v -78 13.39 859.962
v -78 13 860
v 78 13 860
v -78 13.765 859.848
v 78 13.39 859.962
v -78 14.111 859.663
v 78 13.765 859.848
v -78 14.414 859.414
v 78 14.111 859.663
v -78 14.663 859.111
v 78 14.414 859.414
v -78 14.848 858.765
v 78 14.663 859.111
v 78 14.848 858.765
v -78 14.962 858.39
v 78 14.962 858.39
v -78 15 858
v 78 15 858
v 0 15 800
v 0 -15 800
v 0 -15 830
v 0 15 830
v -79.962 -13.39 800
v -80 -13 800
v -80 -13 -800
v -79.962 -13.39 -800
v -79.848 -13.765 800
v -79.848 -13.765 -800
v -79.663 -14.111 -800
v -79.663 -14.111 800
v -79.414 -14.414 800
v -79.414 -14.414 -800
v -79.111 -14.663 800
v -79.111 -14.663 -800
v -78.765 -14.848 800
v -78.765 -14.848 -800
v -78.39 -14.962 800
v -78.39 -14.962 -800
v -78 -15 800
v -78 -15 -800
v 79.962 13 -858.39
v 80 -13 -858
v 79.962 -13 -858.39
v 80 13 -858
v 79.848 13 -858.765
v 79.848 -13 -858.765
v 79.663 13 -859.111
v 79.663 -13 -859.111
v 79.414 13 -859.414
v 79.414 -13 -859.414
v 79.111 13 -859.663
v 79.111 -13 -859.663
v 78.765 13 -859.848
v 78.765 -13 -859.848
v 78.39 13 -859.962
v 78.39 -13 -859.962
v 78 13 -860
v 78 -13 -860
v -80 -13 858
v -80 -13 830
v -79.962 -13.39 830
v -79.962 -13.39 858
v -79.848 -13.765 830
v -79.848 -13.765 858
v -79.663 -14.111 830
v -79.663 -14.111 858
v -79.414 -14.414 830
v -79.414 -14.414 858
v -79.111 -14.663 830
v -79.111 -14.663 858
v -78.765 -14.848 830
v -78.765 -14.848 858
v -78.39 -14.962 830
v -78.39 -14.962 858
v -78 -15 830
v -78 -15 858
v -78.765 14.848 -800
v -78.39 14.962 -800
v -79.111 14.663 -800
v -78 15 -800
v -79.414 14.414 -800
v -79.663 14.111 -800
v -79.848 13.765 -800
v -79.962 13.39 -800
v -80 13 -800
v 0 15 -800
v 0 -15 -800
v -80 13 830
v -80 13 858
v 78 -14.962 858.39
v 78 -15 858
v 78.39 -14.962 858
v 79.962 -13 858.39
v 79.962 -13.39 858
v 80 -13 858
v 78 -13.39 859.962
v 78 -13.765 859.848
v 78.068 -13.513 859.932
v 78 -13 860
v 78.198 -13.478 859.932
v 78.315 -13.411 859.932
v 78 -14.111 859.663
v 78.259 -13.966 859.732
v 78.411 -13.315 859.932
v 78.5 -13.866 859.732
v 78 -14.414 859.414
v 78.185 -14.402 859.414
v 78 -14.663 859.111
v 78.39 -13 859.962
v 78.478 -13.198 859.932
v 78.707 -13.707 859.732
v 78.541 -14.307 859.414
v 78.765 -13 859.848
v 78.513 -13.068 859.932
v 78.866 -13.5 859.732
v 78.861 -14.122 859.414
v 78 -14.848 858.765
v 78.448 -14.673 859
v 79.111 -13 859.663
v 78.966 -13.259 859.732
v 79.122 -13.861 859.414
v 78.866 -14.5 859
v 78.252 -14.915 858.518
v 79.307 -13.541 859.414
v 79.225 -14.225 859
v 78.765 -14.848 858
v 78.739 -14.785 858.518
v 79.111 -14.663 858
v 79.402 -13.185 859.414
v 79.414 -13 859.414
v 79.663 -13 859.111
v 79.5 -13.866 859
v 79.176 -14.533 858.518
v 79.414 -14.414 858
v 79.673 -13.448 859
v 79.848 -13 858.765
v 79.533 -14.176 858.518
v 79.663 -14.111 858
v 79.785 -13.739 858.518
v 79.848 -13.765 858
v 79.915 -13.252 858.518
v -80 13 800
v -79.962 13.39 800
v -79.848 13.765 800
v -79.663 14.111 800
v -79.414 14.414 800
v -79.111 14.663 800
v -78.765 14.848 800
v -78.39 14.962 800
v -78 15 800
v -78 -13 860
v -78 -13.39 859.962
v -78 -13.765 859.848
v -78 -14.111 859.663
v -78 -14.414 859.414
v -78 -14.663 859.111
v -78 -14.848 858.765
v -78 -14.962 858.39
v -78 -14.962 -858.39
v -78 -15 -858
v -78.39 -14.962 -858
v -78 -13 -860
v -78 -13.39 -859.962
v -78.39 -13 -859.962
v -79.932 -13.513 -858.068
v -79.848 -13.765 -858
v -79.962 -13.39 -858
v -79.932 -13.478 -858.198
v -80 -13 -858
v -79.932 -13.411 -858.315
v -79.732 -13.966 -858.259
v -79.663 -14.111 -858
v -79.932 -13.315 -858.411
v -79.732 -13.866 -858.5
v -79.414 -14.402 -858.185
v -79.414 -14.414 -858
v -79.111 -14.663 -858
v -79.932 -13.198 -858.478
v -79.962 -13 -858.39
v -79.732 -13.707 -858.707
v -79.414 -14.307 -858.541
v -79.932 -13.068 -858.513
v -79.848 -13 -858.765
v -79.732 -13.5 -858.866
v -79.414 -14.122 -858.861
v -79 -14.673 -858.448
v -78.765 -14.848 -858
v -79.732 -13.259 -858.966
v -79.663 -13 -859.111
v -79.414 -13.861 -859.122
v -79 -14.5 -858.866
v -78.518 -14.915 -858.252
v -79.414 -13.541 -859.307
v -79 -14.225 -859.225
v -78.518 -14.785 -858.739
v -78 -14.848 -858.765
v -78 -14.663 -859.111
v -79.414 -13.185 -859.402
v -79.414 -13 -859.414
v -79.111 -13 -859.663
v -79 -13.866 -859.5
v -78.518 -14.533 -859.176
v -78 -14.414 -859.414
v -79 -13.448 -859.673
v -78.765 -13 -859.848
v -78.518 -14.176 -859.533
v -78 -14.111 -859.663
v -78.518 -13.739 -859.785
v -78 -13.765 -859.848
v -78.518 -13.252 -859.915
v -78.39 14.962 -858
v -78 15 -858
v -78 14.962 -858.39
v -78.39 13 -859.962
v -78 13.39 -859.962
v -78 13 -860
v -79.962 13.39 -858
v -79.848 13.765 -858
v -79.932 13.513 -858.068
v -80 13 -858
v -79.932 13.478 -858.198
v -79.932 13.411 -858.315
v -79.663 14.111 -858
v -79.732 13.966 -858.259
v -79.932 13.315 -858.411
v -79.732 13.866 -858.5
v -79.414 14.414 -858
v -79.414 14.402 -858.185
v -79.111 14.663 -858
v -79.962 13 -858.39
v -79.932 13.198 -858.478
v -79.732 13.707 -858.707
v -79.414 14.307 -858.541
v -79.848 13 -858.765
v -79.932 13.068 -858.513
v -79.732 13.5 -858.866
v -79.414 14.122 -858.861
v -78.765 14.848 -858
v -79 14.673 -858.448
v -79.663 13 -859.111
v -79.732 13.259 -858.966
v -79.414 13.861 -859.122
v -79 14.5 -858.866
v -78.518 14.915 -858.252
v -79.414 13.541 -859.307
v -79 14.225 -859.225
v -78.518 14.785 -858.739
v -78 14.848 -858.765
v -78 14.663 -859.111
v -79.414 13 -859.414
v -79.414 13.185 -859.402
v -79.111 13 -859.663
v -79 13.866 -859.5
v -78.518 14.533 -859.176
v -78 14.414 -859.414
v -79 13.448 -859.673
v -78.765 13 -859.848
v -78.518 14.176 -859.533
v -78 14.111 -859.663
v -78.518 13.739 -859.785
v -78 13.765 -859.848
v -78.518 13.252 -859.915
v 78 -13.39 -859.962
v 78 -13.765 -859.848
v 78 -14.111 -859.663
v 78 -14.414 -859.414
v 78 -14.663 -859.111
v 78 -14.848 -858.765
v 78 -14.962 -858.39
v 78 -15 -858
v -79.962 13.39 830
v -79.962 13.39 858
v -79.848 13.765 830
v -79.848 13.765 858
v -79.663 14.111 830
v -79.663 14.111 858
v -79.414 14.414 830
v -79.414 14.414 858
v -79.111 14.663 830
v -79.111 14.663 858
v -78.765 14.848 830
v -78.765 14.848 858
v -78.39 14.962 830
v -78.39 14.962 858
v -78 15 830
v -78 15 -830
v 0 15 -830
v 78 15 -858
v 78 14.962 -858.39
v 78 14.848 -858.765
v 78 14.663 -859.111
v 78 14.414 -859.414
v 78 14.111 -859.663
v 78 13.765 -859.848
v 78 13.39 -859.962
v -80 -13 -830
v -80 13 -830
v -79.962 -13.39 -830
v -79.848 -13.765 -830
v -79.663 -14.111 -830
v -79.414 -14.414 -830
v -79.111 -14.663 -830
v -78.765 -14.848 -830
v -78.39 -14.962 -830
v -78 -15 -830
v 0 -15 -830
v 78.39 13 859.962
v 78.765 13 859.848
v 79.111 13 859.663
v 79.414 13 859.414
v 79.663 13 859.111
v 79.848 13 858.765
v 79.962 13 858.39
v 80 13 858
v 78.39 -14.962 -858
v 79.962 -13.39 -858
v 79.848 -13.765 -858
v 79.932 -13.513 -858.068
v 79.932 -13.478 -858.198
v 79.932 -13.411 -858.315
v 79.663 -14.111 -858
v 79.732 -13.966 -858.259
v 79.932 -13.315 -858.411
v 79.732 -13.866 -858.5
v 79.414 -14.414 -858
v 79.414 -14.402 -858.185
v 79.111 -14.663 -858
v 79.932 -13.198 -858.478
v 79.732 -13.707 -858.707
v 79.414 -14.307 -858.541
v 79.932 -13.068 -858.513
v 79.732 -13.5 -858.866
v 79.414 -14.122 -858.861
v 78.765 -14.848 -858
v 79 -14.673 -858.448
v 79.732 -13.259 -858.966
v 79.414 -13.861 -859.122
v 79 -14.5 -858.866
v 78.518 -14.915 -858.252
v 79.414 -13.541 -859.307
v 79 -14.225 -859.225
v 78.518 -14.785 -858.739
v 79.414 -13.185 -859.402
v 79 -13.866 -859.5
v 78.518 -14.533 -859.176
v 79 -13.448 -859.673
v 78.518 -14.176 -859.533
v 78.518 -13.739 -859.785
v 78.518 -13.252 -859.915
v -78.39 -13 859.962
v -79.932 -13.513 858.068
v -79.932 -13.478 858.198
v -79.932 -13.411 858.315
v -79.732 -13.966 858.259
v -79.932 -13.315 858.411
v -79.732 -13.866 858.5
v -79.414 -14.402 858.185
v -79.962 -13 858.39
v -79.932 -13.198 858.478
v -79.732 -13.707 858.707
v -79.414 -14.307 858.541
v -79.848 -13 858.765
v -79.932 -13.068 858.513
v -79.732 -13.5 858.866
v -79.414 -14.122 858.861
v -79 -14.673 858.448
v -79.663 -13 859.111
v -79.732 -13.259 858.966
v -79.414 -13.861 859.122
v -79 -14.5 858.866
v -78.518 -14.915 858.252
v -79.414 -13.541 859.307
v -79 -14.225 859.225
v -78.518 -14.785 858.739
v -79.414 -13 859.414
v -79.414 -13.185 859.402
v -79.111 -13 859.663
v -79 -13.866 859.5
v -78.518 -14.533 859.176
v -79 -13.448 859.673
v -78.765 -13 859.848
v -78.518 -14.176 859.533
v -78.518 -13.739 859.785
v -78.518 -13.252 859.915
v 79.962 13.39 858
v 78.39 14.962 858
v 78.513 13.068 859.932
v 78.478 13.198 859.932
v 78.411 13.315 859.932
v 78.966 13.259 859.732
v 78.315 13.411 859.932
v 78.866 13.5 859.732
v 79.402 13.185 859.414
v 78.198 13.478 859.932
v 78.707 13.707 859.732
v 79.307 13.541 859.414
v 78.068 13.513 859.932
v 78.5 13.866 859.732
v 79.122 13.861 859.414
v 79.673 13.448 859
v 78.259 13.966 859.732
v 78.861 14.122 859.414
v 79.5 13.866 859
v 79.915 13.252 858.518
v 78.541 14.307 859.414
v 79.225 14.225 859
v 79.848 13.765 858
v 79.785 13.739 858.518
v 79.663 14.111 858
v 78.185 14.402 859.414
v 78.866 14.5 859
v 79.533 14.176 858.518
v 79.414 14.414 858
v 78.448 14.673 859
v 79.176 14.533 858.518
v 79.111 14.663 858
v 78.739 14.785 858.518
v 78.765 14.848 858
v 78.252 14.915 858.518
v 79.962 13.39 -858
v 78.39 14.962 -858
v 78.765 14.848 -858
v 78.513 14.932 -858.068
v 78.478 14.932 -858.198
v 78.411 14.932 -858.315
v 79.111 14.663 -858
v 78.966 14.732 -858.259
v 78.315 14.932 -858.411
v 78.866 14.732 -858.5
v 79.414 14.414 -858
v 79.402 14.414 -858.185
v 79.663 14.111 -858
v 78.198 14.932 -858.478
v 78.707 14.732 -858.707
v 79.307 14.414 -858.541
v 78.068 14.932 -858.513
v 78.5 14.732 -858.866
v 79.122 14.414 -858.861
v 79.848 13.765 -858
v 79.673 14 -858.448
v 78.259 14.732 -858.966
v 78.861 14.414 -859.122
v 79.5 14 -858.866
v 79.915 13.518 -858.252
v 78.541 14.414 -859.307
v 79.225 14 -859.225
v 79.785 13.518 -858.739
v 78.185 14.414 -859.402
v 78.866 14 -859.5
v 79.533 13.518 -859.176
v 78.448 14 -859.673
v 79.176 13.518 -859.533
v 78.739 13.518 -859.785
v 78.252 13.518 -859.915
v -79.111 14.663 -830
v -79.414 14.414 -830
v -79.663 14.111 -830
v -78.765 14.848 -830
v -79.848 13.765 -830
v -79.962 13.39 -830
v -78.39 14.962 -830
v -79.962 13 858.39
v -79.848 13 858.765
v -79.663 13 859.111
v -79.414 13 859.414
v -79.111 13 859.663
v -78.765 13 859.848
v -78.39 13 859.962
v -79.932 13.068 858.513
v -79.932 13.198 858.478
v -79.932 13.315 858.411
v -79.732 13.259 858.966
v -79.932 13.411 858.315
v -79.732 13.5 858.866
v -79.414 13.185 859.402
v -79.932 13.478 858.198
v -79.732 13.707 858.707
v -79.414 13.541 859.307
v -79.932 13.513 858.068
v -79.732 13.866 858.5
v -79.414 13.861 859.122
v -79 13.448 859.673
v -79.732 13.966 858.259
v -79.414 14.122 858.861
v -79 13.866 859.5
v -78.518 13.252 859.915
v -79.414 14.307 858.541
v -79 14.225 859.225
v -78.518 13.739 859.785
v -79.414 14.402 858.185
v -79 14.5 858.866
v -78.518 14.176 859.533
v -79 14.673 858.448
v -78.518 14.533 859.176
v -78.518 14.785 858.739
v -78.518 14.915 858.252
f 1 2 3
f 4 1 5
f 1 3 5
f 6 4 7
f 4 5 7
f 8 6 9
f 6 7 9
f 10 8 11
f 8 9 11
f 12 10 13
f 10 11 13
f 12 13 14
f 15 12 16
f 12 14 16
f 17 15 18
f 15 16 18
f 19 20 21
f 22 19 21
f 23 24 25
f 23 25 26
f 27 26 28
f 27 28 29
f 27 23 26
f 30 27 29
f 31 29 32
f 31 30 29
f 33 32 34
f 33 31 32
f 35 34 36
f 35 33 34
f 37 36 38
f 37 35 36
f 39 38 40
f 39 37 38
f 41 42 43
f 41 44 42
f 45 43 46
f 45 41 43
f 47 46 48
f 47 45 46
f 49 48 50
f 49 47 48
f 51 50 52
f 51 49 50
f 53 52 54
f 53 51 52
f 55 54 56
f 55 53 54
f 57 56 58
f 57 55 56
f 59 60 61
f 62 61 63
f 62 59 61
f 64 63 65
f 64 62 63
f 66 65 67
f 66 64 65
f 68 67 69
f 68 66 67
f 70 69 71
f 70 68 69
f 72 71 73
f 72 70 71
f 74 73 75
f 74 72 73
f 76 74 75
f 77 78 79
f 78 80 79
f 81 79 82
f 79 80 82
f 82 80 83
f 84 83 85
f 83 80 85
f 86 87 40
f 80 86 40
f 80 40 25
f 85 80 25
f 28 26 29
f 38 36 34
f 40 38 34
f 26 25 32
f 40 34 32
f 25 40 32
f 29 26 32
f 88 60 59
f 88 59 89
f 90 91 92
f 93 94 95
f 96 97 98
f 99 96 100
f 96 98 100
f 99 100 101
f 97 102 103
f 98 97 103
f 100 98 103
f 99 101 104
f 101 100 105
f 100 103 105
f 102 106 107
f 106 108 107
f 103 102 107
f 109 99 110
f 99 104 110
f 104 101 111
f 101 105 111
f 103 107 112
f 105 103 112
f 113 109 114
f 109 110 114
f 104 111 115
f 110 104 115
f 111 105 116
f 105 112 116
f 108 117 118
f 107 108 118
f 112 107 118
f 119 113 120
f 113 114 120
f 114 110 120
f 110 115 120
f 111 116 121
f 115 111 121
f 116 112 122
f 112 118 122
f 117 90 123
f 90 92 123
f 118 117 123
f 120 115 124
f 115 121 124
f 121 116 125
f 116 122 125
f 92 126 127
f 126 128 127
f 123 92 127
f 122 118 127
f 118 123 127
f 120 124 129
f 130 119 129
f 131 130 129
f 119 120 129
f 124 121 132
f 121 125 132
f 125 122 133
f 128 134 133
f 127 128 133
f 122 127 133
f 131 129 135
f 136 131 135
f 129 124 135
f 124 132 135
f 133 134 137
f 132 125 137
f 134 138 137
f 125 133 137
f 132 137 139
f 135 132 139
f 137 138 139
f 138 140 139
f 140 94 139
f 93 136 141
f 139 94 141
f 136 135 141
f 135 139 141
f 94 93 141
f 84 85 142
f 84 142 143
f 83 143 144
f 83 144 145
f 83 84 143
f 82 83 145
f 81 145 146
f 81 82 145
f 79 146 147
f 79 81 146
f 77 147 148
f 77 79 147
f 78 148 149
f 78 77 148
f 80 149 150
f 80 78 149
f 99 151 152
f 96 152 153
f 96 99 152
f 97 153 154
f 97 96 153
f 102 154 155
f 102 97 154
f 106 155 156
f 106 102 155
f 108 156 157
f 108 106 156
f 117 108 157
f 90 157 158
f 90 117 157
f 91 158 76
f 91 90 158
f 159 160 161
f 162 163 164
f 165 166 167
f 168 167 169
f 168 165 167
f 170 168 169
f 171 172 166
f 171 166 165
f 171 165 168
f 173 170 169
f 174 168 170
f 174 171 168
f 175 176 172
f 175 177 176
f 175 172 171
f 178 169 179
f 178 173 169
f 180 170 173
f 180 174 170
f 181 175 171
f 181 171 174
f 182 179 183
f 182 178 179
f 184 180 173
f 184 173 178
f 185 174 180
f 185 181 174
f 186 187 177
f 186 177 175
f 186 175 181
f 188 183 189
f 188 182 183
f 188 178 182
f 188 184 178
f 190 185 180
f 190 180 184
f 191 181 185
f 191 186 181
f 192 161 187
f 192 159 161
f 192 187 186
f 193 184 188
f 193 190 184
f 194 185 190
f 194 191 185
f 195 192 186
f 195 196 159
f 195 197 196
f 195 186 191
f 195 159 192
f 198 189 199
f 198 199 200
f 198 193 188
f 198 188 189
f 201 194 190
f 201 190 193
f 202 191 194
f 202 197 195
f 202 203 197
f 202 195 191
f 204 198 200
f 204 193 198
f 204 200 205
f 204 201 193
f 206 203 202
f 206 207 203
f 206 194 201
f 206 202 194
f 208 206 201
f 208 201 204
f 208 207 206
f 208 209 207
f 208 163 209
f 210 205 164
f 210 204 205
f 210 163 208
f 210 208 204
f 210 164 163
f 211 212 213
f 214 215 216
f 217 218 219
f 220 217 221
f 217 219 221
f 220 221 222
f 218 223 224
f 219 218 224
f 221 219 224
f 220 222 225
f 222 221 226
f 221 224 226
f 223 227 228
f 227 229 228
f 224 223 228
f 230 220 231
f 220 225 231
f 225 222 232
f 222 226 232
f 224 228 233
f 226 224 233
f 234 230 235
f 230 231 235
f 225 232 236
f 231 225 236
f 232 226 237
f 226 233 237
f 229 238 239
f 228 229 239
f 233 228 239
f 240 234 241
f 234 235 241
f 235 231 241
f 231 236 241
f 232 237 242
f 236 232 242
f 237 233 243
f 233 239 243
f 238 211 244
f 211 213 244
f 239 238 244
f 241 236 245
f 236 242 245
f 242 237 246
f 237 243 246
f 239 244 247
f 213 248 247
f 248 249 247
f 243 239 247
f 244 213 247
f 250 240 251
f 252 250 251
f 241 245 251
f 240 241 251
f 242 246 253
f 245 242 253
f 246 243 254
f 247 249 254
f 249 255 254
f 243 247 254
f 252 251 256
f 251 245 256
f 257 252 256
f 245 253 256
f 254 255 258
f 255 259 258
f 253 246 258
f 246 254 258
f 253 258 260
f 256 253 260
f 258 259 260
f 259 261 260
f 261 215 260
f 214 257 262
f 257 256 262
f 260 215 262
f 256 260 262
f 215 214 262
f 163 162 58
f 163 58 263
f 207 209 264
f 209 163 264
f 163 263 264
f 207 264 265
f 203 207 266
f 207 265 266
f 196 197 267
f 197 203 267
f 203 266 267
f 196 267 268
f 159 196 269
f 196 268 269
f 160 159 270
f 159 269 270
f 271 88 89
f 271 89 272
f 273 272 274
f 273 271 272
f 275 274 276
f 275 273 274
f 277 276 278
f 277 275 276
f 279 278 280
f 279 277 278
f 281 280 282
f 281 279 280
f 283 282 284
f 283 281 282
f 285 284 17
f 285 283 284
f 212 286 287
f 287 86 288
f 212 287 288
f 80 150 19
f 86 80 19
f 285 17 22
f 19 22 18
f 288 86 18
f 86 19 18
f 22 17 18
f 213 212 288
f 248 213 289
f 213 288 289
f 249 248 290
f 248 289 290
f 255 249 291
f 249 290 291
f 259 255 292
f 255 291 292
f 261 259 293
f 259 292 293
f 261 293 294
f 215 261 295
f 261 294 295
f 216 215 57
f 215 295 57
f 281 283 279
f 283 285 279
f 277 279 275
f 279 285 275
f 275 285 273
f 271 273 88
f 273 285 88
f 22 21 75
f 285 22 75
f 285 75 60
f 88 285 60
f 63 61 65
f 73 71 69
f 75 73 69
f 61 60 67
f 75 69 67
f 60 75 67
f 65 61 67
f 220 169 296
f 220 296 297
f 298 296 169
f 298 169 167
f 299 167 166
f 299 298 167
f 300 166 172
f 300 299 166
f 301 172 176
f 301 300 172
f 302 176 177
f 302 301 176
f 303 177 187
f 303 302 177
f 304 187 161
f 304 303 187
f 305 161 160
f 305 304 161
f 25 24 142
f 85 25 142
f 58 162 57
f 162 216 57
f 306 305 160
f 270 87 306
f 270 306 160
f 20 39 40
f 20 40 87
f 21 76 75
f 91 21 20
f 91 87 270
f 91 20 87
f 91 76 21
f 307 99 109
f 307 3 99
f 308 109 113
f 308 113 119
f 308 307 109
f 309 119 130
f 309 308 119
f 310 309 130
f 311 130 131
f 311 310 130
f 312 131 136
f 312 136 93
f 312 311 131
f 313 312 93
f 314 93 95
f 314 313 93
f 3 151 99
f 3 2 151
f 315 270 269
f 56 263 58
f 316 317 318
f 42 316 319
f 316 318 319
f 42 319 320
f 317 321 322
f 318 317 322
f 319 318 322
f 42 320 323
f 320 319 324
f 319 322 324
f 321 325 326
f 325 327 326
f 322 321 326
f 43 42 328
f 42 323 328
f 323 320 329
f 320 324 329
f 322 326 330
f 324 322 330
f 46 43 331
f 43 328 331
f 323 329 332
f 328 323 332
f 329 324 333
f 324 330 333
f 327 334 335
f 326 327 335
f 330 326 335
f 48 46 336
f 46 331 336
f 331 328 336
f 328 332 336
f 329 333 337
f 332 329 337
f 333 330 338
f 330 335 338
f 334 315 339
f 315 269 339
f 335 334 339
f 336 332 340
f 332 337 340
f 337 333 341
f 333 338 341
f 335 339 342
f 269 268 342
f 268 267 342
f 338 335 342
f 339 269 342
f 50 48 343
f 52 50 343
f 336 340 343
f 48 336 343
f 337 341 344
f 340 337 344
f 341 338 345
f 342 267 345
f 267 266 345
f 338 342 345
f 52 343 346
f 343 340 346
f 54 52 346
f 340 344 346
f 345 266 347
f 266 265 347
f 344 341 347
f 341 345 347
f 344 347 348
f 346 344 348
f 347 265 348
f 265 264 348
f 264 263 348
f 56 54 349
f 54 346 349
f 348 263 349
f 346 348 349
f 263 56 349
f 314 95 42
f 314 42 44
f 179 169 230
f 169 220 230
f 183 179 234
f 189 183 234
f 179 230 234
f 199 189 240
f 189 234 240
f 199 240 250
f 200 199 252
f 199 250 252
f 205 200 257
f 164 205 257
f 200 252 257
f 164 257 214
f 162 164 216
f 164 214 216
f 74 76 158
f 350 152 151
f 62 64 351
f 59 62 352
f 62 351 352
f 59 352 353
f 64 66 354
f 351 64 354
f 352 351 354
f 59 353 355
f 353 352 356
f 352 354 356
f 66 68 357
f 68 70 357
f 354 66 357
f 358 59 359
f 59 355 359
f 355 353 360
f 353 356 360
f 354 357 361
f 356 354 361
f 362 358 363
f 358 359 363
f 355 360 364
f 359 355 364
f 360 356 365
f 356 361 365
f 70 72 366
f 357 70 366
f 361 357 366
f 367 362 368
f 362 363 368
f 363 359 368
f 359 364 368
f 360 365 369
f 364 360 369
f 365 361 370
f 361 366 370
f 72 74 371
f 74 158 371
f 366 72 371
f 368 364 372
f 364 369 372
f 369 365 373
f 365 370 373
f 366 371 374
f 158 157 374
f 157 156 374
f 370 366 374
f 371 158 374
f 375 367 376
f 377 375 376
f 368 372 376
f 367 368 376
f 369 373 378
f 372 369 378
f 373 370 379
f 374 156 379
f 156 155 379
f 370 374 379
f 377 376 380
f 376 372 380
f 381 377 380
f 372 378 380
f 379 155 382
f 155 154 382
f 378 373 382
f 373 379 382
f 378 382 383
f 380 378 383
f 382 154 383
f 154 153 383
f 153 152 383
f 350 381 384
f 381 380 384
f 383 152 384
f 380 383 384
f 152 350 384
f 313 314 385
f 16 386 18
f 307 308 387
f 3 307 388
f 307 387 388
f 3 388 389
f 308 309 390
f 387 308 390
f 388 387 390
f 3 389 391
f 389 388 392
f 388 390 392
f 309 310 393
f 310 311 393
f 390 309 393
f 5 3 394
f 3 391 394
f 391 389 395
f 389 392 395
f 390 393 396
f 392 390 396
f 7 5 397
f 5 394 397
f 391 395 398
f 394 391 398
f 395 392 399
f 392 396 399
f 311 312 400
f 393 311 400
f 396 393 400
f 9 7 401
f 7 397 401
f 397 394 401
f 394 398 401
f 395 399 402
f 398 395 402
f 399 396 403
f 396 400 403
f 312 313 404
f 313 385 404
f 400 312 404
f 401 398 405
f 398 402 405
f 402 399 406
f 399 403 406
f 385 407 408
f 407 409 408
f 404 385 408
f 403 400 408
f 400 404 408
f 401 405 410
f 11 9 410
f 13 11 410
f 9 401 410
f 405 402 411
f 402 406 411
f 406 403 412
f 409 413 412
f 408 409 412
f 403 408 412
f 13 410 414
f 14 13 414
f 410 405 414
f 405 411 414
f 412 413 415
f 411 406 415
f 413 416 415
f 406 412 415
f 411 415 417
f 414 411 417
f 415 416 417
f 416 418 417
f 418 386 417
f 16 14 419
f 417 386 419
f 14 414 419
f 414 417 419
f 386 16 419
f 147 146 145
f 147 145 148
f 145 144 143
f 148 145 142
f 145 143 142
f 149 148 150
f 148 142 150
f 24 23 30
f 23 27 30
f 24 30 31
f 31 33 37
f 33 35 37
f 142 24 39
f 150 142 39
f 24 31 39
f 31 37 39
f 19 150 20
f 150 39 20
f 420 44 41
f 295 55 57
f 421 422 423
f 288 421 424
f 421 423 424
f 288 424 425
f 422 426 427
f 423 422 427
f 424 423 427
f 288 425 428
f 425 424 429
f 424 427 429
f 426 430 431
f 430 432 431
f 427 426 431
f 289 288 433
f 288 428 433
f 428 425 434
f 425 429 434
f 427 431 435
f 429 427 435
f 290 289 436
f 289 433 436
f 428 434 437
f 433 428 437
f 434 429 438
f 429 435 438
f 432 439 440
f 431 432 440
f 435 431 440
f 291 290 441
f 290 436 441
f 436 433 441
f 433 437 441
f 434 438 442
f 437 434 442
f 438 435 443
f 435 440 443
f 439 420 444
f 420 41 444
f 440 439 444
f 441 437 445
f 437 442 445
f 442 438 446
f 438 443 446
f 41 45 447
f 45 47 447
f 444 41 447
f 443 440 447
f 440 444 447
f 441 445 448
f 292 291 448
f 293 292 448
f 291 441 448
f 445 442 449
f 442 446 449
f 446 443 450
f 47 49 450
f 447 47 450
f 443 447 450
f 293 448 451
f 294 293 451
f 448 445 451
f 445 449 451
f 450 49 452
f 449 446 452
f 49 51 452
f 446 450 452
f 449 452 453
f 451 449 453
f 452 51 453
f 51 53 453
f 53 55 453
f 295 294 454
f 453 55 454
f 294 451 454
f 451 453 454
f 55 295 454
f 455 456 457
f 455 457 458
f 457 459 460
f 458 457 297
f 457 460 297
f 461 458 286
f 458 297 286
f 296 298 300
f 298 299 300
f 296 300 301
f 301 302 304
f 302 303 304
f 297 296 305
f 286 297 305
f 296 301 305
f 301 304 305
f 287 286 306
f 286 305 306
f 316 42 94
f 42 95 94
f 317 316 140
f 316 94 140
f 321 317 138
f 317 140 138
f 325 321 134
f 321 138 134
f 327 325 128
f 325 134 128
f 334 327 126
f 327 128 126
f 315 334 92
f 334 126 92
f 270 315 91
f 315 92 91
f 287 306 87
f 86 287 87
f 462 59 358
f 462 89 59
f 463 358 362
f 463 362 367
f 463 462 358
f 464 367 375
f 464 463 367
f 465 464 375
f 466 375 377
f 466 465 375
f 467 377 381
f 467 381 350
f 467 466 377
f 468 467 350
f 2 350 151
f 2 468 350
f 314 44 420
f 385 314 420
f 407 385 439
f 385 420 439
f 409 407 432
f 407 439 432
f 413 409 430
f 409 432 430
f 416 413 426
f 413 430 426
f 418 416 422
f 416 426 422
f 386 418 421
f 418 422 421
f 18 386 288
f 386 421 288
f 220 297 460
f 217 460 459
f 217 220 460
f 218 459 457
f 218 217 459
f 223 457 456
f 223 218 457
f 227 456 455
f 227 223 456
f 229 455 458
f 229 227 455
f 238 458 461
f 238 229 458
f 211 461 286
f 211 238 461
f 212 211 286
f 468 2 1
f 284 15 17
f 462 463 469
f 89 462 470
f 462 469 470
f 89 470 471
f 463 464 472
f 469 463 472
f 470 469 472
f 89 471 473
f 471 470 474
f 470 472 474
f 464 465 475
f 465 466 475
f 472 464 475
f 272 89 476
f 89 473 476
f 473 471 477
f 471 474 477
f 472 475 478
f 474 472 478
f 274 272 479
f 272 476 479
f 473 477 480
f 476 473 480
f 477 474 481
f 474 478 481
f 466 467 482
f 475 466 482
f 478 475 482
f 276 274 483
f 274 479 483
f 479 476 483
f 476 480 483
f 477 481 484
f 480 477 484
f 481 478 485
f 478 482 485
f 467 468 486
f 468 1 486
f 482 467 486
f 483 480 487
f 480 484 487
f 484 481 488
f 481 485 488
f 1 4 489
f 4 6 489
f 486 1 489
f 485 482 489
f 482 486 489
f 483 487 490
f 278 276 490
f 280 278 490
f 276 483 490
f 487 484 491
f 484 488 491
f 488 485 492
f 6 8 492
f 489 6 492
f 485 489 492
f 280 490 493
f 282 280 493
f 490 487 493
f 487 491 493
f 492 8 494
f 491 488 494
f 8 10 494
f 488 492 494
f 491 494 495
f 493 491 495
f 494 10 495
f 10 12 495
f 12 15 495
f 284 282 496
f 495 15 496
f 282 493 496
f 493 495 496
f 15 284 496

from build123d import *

# Parameters (mm, degrees)
F0_W     = 160
F0_H     = 30
F1_DEPTH = 860
F2_R     = 2
F3_W     = 2
F3_H     = 30
F3_W_2   = 78
F4_DEPTH = 30.001


with BuildPart() as f1:
    # F0 (on Top) → F1 (new body, symmetric)
    with BuildSketch(Plane.XY):
        Rectangle(F0_W, F0_H)
    extrude(amount=F1_DEPTH, both=True)

    # F2
    f2_edges = [f1.edges().sort_by_distance(p)[0] for p in [
        (0, -15, -860),
        (80, -15, 0),
        (0, -15, 860),
        (-80, -15, 0),
        (80, 0, -860),
        (80, 15, 0),
        (80, 0, 860),
        (0, 15, 860),
        (-80, 0, 860),
        (0, 15, -860),
        (-80, 15, 0),
        (-80, 0, -860),
    ]]
    fillet(f2_edges, radius=F2_R)

    # F3 (on face) → F4 (cut, through all)
    with BuildSketch(Plane.XZ.offset(15)):
        with Locations((-79, -815)):
            Rectangle(F3_W, F3_H)
        with Locations((-39, -815)):
            Rectangle(F3_W_2, F3_H)
        with Locations((-79, 815)):
            Rectangle(F3_W, F3_H)
        with Locations((-39, 815)):
            Rectangle(F3_W_2, F3_H)
    extrude(amount=-F4_DEPTH, mode=Mode.SUBTRACT)


solid = f1.part
